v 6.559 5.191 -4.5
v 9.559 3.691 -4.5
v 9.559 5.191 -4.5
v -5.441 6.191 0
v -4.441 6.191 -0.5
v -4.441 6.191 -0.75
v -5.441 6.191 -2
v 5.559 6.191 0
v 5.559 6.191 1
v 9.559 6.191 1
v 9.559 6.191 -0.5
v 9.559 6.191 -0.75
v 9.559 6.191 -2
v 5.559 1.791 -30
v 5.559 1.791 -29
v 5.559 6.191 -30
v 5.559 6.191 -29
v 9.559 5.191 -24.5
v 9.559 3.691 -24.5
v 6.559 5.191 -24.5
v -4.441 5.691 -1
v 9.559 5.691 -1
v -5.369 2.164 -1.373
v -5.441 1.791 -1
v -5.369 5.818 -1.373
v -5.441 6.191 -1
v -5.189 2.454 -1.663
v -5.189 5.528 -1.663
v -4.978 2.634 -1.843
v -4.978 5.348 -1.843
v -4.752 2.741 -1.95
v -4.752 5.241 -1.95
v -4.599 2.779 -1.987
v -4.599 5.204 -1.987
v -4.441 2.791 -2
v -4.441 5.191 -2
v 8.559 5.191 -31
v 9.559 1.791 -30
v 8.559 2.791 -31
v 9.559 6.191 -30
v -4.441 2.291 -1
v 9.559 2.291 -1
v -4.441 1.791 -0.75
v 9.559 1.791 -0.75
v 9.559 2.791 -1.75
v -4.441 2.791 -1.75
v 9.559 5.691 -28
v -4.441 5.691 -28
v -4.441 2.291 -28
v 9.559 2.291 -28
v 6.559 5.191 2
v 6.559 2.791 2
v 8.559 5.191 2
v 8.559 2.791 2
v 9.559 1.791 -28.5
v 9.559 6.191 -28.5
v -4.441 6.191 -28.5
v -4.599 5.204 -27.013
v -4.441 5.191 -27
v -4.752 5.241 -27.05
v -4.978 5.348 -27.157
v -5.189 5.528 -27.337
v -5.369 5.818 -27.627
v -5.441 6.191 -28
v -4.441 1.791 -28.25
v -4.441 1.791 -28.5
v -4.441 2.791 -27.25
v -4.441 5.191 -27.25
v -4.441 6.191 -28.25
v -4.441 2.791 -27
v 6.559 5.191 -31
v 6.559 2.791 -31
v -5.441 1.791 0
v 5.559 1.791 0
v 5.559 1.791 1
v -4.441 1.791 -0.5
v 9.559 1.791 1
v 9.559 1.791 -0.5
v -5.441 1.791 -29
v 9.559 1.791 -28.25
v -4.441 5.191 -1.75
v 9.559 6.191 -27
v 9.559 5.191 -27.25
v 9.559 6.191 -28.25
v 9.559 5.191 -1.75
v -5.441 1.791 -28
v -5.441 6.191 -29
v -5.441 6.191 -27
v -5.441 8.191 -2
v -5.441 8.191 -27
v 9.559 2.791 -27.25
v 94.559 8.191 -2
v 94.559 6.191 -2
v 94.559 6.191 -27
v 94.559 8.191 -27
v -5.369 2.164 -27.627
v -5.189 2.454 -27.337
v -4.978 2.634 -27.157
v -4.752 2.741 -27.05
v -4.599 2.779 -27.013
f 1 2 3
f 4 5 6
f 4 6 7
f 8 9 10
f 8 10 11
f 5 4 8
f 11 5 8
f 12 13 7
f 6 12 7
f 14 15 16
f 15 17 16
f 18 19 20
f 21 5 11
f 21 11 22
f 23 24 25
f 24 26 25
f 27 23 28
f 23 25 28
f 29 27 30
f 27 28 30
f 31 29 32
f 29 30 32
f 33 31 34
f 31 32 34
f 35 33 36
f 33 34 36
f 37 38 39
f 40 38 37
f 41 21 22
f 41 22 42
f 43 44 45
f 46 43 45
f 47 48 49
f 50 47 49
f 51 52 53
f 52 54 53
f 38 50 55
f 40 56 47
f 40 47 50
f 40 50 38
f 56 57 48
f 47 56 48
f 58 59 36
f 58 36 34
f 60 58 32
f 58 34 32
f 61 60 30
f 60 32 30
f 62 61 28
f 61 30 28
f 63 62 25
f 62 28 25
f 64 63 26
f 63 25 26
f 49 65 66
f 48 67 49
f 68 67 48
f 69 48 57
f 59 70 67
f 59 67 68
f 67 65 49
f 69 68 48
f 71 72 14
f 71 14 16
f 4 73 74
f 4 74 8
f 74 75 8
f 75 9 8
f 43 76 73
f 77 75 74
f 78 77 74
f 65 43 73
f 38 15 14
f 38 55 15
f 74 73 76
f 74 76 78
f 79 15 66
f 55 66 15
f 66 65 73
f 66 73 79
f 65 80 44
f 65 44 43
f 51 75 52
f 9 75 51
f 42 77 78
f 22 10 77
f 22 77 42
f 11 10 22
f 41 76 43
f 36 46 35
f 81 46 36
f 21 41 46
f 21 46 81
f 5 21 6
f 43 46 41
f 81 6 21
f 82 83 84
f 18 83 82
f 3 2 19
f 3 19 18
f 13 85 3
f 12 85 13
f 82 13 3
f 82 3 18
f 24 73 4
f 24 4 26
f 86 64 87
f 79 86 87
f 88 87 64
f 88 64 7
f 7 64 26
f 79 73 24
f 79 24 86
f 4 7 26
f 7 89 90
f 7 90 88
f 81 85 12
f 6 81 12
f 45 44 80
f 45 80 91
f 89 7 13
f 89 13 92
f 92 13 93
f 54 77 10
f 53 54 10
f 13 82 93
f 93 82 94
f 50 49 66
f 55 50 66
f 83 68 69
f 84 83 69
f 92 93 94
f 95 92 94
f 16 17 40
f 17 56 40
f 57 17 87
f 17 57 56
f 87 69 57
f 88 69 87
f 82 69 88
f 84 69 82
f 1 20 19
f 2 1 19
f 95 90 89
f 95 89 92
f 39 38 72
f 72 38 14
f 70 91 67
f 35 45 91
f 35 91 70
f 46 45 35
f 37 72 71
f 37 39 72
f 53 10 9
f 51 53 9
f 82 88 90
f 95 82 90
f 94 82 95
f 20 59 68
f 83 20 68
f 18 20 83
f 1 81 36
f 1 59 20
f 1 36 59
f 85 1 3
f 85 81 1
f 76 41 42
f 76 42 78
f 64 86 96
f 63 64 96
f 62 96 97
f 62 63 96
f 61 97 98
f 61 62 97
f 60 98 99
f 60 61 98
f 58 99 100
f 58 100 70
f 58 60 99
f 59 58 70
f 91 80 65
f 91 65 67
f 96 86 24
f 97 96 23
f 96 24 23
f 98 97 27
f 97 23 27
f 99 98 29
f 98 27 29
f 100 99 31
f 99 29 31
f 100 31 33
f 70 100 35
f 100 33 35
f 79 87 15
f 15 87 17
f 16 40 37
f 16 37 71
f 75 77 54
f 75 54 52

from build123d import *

# Parameters (mm, degrees)
BOSS_EXTRUDE1_DEPTH = 29
CUT_EXTRUDE1_REACH  = 35.231
SKETCH3_W           = 4.5
SKETCH3_H           = 1.5
CUT_EXTRUDE2_REACH  = 35.231
SKETCH4_W           = 25
SKETCH4_H           = 2.4
FILLET1_R           = 1
CHAMFER1_SIZE       = 1.75
BOSS_EXTRUDE2_DEPTH = 14
SKETCH6_W           = 2
SKETCH6_H           = 4.4
BOSS_EXTRUDE3_DEPTH = 4
CHAMFER2_SIZE       = 1
SKETCH7_W           = 100
SKETCH7_H           = 25
BOSS_EXTRUDE4_DEPTH = 2


# Some blends are built 0.0001 mm under size
with BuildPart() as part:
    # Sketch2 → Boss-Extrude1 (new body)
    with BuildSketch(Plane.XY):
        Polygon((6.559345521, 5.191043118), (9.559345521, 3.691043118), (9.559345521, 5.191043118), (9.559345521, 6.191043118), (-5.440654479, 6.191043118), (-5.440654479, 1.791043118), (9.559345521, 1.791043118), (9.559345521, 2.791043118), (-4.440654479, 2.791043118), (-4.440654479, 5.191043118), align=None)
    extrude(amount=-BOSS_EXTRUDE1_DEPTH)

    # Sketch3 → Cut-Extrude1 (cut, up to next)
    with BuildSketch(Plane(origin=(9.559345521, 0, 0), x_dir=(0, 0, -1), z_dir=(1, 0, 0)), mode=Mode.PRIVATE) as cut_extrude1_sk1:
        with Locations((2.25, 4.441043118)):
            Rectangle(SKETCH3_W, SKETCH3_H)
    cut_extrude1_tool1 = extrude(cut_extrude1_sk1.sketch, amount=-CUT_EXTRUDE1_REACH, mode=Mode.PRIVATE) & part.part
    # Sketch3 → Cut-Extrude1 (cut, up to next)
    with BuildSketch(Plane(origin=(9.559345521, 0, 0), x_dir=(0, 0, -1), z_dir=(1, 0, 0)), mode=Mode.PRIVATE) as cut_extrude1_sk2:
        with Locations((26.75, 4.441043118)):
            Rectangle(SKETCH3_W, SKETCH3_H)
    cut_extrude1_tool2 = extrude(cut_extrude1_sk2.sketch, amount=-CUT_EXTRUDE1_REACH, mode=Mode.PRIVATE) & part.part
    add(cut_extrude1_tool1.solids().sort_by_distance((9.559346, 4.441043, -2.25))[0], mode=Mode.SUBTRACT)
    add(cut_extrude1_tool2.solids().sort_by_distance((9.559346, 4.441043, -26.75))[0], mode=Mode.SUBTRACT)

    # Sketch4 → Cut-Extrude2 (cut, up to next)
    with BuildSketch(Plane.ZY.offset(5.440654479), mode=Mode.PRIVATE) as cut_extrude2_sk1:
        with Locations((-14.5, 3.991043118)):
            Rectangle(SKETCH4_W, SKETCH4_H)
    cut_extrude2_tool1 = extrude(cut_extrude2_sk1.sketch, amount=-CUT_EXTRUDE2_REACH, mode=Mode.PRIVATE) & part.part
    add(cut_extrude2_tool1.solids().sort_by_distance((-5.440654, 3.991043, -14.5))[0], mode=Mode.SUBTRACT)

    # Fillet1
    fillet1_edges = [part.edges().sort_by_distance(p)[0] for p in [
        (-5.440654479, 3.991043118, -2),
        (-5.440654479, 2.791043118, -14.5),
        (-5.440654479, 3.991043118, -27),
        (-5.440654479, 5.191043118, -14.5),
    ]]
    fillet(fillet1_edges, radius=FILLET1_R - 0.0001)  # a hair under: the kernel refuses the full size

    # Chamfer1
    # the kernel refuses this chamfer: 1.75 mm, written as the material it takes off along each edge
    with BuildSketch(Plane(origin=(14.05979075, 2.791043118, -29), x_dir=(0, -0.9996219169112968, -0.02749587661058612), z_dir=(-1, 0, 0))) as chamfer1_piece_1:
        Polygon((CHAMFER1_SIZE * 0.999621916911, CHAMFER1_SIZE * 0.0274958766106), (-CHAMFER1_SIZE * 0.0274958766106, CHAMFER1_SIZE * 0.999621916911), (0, 0), align=None)
    extrude(amount=18.500445229, mode=Mode.SUBTRACT)
    with BuildSketch(Plane(origin=(-4.440654479, 5.191043118, -29), x_dir=(0, -0.02749587661058662, 0.9996219169112968), z_dir=(1, 0, 0)), Plane(origin=(14.05979075, 5.191043118, 0), x_dir=(0, -0.02749587661058661, -0.9996219169112968), z_dir=(-1, 0, 0)), Plane(origin=(14.05979075, 2.791043118, 0), x_dir=(0, -0.9996219169112968, 0.027495876610586382), z_dir=(-1, 0, 0))) as chamfer1_piece_2:
        Polygon((CHAMFER1_SIZE * 0.999621916911, -CHAMFER1_SIZE * 0.0274958766106), (-CHAMFER1_SIZE * 0.0274958766106, -CHAMFER1_SIZE * 0.999621916911), (0, 0), align=None)
    extrude(amount=18.500445229, mode=Mode.SUBTRACT)

    # Sketch5 → Boss-Extrude2 (add)
    with BuildSketch(Plane(origin=(-4.440654479, 0, 0), x_dir=(0, 0, -1), z_dir=(1, 0, 0))):
        Polygon((0, 1.791043118), (0, 6.191043118), (0.5, 6.191043118), (1, 5.691043118), (1, 2.291043118), (0.5, 1.791043118), align=None)
        Polygon((28, 2.291043118), (28.5, 1.791043118), (29, 1.791043118), (29, 6.191043118), (28.5, 6.191043118), (28, 5.691043118), align=None)
    extrude(amount=BOSS_EXTRUDE2_DEPTH)

    # Sketch6 → Boss-Extrude3 (add)
    with BuildSketch(Plane(origin=(9.559345521, 0, 0), x_dir=(0, 0, -1), z_dir=(1, 0, 0))):
        with Locations((-1, 3.991043118)):
            Rectangle(SKETCH6_W, SKETCH6_H)
        with Locations((30, 3.991043118)):
            Rectangle(SKETCH6_W, SKETCH6_H)
    extrude(amount=-BOSS_EXTRUDE3_DEPTH)

    # Chamfer2
    chamfer2_edges = [part.edges().sort_by_distance(p)[0] for p in [
        (5.559345521, 3.991043118, 2),
        (7.559345521, 1.791043118, 2),
        (7.559345521, 6.191043118, 2),
        (9.559345521, 3.991043118, 2),
        (5.559345521, 3.991043118, -31),
        (7.559345521, 6.191043118, -31),
        (7.559345521, 1.791043118, -31),
        (9.559345521, 3.991043118, -31),
    ]]
    chamfer(chamfer2_edges, length=CHAMFER2_SIZE)

    # Sketch7 → Boss-Extrude4 (add)
    with BuildSketch(Plane(origin=(0, 6.191043118, 0), x_dir=(1, 0, 0), z_dir=(0, 1, 0))):
        with Locations((44.559345521, 14.5)):
            Rectangle(SKETCH7_W, SKETCH7_H)
    extrude(amount=BOSS_EXTRUDE4_DEPTH)


solid = part.part
